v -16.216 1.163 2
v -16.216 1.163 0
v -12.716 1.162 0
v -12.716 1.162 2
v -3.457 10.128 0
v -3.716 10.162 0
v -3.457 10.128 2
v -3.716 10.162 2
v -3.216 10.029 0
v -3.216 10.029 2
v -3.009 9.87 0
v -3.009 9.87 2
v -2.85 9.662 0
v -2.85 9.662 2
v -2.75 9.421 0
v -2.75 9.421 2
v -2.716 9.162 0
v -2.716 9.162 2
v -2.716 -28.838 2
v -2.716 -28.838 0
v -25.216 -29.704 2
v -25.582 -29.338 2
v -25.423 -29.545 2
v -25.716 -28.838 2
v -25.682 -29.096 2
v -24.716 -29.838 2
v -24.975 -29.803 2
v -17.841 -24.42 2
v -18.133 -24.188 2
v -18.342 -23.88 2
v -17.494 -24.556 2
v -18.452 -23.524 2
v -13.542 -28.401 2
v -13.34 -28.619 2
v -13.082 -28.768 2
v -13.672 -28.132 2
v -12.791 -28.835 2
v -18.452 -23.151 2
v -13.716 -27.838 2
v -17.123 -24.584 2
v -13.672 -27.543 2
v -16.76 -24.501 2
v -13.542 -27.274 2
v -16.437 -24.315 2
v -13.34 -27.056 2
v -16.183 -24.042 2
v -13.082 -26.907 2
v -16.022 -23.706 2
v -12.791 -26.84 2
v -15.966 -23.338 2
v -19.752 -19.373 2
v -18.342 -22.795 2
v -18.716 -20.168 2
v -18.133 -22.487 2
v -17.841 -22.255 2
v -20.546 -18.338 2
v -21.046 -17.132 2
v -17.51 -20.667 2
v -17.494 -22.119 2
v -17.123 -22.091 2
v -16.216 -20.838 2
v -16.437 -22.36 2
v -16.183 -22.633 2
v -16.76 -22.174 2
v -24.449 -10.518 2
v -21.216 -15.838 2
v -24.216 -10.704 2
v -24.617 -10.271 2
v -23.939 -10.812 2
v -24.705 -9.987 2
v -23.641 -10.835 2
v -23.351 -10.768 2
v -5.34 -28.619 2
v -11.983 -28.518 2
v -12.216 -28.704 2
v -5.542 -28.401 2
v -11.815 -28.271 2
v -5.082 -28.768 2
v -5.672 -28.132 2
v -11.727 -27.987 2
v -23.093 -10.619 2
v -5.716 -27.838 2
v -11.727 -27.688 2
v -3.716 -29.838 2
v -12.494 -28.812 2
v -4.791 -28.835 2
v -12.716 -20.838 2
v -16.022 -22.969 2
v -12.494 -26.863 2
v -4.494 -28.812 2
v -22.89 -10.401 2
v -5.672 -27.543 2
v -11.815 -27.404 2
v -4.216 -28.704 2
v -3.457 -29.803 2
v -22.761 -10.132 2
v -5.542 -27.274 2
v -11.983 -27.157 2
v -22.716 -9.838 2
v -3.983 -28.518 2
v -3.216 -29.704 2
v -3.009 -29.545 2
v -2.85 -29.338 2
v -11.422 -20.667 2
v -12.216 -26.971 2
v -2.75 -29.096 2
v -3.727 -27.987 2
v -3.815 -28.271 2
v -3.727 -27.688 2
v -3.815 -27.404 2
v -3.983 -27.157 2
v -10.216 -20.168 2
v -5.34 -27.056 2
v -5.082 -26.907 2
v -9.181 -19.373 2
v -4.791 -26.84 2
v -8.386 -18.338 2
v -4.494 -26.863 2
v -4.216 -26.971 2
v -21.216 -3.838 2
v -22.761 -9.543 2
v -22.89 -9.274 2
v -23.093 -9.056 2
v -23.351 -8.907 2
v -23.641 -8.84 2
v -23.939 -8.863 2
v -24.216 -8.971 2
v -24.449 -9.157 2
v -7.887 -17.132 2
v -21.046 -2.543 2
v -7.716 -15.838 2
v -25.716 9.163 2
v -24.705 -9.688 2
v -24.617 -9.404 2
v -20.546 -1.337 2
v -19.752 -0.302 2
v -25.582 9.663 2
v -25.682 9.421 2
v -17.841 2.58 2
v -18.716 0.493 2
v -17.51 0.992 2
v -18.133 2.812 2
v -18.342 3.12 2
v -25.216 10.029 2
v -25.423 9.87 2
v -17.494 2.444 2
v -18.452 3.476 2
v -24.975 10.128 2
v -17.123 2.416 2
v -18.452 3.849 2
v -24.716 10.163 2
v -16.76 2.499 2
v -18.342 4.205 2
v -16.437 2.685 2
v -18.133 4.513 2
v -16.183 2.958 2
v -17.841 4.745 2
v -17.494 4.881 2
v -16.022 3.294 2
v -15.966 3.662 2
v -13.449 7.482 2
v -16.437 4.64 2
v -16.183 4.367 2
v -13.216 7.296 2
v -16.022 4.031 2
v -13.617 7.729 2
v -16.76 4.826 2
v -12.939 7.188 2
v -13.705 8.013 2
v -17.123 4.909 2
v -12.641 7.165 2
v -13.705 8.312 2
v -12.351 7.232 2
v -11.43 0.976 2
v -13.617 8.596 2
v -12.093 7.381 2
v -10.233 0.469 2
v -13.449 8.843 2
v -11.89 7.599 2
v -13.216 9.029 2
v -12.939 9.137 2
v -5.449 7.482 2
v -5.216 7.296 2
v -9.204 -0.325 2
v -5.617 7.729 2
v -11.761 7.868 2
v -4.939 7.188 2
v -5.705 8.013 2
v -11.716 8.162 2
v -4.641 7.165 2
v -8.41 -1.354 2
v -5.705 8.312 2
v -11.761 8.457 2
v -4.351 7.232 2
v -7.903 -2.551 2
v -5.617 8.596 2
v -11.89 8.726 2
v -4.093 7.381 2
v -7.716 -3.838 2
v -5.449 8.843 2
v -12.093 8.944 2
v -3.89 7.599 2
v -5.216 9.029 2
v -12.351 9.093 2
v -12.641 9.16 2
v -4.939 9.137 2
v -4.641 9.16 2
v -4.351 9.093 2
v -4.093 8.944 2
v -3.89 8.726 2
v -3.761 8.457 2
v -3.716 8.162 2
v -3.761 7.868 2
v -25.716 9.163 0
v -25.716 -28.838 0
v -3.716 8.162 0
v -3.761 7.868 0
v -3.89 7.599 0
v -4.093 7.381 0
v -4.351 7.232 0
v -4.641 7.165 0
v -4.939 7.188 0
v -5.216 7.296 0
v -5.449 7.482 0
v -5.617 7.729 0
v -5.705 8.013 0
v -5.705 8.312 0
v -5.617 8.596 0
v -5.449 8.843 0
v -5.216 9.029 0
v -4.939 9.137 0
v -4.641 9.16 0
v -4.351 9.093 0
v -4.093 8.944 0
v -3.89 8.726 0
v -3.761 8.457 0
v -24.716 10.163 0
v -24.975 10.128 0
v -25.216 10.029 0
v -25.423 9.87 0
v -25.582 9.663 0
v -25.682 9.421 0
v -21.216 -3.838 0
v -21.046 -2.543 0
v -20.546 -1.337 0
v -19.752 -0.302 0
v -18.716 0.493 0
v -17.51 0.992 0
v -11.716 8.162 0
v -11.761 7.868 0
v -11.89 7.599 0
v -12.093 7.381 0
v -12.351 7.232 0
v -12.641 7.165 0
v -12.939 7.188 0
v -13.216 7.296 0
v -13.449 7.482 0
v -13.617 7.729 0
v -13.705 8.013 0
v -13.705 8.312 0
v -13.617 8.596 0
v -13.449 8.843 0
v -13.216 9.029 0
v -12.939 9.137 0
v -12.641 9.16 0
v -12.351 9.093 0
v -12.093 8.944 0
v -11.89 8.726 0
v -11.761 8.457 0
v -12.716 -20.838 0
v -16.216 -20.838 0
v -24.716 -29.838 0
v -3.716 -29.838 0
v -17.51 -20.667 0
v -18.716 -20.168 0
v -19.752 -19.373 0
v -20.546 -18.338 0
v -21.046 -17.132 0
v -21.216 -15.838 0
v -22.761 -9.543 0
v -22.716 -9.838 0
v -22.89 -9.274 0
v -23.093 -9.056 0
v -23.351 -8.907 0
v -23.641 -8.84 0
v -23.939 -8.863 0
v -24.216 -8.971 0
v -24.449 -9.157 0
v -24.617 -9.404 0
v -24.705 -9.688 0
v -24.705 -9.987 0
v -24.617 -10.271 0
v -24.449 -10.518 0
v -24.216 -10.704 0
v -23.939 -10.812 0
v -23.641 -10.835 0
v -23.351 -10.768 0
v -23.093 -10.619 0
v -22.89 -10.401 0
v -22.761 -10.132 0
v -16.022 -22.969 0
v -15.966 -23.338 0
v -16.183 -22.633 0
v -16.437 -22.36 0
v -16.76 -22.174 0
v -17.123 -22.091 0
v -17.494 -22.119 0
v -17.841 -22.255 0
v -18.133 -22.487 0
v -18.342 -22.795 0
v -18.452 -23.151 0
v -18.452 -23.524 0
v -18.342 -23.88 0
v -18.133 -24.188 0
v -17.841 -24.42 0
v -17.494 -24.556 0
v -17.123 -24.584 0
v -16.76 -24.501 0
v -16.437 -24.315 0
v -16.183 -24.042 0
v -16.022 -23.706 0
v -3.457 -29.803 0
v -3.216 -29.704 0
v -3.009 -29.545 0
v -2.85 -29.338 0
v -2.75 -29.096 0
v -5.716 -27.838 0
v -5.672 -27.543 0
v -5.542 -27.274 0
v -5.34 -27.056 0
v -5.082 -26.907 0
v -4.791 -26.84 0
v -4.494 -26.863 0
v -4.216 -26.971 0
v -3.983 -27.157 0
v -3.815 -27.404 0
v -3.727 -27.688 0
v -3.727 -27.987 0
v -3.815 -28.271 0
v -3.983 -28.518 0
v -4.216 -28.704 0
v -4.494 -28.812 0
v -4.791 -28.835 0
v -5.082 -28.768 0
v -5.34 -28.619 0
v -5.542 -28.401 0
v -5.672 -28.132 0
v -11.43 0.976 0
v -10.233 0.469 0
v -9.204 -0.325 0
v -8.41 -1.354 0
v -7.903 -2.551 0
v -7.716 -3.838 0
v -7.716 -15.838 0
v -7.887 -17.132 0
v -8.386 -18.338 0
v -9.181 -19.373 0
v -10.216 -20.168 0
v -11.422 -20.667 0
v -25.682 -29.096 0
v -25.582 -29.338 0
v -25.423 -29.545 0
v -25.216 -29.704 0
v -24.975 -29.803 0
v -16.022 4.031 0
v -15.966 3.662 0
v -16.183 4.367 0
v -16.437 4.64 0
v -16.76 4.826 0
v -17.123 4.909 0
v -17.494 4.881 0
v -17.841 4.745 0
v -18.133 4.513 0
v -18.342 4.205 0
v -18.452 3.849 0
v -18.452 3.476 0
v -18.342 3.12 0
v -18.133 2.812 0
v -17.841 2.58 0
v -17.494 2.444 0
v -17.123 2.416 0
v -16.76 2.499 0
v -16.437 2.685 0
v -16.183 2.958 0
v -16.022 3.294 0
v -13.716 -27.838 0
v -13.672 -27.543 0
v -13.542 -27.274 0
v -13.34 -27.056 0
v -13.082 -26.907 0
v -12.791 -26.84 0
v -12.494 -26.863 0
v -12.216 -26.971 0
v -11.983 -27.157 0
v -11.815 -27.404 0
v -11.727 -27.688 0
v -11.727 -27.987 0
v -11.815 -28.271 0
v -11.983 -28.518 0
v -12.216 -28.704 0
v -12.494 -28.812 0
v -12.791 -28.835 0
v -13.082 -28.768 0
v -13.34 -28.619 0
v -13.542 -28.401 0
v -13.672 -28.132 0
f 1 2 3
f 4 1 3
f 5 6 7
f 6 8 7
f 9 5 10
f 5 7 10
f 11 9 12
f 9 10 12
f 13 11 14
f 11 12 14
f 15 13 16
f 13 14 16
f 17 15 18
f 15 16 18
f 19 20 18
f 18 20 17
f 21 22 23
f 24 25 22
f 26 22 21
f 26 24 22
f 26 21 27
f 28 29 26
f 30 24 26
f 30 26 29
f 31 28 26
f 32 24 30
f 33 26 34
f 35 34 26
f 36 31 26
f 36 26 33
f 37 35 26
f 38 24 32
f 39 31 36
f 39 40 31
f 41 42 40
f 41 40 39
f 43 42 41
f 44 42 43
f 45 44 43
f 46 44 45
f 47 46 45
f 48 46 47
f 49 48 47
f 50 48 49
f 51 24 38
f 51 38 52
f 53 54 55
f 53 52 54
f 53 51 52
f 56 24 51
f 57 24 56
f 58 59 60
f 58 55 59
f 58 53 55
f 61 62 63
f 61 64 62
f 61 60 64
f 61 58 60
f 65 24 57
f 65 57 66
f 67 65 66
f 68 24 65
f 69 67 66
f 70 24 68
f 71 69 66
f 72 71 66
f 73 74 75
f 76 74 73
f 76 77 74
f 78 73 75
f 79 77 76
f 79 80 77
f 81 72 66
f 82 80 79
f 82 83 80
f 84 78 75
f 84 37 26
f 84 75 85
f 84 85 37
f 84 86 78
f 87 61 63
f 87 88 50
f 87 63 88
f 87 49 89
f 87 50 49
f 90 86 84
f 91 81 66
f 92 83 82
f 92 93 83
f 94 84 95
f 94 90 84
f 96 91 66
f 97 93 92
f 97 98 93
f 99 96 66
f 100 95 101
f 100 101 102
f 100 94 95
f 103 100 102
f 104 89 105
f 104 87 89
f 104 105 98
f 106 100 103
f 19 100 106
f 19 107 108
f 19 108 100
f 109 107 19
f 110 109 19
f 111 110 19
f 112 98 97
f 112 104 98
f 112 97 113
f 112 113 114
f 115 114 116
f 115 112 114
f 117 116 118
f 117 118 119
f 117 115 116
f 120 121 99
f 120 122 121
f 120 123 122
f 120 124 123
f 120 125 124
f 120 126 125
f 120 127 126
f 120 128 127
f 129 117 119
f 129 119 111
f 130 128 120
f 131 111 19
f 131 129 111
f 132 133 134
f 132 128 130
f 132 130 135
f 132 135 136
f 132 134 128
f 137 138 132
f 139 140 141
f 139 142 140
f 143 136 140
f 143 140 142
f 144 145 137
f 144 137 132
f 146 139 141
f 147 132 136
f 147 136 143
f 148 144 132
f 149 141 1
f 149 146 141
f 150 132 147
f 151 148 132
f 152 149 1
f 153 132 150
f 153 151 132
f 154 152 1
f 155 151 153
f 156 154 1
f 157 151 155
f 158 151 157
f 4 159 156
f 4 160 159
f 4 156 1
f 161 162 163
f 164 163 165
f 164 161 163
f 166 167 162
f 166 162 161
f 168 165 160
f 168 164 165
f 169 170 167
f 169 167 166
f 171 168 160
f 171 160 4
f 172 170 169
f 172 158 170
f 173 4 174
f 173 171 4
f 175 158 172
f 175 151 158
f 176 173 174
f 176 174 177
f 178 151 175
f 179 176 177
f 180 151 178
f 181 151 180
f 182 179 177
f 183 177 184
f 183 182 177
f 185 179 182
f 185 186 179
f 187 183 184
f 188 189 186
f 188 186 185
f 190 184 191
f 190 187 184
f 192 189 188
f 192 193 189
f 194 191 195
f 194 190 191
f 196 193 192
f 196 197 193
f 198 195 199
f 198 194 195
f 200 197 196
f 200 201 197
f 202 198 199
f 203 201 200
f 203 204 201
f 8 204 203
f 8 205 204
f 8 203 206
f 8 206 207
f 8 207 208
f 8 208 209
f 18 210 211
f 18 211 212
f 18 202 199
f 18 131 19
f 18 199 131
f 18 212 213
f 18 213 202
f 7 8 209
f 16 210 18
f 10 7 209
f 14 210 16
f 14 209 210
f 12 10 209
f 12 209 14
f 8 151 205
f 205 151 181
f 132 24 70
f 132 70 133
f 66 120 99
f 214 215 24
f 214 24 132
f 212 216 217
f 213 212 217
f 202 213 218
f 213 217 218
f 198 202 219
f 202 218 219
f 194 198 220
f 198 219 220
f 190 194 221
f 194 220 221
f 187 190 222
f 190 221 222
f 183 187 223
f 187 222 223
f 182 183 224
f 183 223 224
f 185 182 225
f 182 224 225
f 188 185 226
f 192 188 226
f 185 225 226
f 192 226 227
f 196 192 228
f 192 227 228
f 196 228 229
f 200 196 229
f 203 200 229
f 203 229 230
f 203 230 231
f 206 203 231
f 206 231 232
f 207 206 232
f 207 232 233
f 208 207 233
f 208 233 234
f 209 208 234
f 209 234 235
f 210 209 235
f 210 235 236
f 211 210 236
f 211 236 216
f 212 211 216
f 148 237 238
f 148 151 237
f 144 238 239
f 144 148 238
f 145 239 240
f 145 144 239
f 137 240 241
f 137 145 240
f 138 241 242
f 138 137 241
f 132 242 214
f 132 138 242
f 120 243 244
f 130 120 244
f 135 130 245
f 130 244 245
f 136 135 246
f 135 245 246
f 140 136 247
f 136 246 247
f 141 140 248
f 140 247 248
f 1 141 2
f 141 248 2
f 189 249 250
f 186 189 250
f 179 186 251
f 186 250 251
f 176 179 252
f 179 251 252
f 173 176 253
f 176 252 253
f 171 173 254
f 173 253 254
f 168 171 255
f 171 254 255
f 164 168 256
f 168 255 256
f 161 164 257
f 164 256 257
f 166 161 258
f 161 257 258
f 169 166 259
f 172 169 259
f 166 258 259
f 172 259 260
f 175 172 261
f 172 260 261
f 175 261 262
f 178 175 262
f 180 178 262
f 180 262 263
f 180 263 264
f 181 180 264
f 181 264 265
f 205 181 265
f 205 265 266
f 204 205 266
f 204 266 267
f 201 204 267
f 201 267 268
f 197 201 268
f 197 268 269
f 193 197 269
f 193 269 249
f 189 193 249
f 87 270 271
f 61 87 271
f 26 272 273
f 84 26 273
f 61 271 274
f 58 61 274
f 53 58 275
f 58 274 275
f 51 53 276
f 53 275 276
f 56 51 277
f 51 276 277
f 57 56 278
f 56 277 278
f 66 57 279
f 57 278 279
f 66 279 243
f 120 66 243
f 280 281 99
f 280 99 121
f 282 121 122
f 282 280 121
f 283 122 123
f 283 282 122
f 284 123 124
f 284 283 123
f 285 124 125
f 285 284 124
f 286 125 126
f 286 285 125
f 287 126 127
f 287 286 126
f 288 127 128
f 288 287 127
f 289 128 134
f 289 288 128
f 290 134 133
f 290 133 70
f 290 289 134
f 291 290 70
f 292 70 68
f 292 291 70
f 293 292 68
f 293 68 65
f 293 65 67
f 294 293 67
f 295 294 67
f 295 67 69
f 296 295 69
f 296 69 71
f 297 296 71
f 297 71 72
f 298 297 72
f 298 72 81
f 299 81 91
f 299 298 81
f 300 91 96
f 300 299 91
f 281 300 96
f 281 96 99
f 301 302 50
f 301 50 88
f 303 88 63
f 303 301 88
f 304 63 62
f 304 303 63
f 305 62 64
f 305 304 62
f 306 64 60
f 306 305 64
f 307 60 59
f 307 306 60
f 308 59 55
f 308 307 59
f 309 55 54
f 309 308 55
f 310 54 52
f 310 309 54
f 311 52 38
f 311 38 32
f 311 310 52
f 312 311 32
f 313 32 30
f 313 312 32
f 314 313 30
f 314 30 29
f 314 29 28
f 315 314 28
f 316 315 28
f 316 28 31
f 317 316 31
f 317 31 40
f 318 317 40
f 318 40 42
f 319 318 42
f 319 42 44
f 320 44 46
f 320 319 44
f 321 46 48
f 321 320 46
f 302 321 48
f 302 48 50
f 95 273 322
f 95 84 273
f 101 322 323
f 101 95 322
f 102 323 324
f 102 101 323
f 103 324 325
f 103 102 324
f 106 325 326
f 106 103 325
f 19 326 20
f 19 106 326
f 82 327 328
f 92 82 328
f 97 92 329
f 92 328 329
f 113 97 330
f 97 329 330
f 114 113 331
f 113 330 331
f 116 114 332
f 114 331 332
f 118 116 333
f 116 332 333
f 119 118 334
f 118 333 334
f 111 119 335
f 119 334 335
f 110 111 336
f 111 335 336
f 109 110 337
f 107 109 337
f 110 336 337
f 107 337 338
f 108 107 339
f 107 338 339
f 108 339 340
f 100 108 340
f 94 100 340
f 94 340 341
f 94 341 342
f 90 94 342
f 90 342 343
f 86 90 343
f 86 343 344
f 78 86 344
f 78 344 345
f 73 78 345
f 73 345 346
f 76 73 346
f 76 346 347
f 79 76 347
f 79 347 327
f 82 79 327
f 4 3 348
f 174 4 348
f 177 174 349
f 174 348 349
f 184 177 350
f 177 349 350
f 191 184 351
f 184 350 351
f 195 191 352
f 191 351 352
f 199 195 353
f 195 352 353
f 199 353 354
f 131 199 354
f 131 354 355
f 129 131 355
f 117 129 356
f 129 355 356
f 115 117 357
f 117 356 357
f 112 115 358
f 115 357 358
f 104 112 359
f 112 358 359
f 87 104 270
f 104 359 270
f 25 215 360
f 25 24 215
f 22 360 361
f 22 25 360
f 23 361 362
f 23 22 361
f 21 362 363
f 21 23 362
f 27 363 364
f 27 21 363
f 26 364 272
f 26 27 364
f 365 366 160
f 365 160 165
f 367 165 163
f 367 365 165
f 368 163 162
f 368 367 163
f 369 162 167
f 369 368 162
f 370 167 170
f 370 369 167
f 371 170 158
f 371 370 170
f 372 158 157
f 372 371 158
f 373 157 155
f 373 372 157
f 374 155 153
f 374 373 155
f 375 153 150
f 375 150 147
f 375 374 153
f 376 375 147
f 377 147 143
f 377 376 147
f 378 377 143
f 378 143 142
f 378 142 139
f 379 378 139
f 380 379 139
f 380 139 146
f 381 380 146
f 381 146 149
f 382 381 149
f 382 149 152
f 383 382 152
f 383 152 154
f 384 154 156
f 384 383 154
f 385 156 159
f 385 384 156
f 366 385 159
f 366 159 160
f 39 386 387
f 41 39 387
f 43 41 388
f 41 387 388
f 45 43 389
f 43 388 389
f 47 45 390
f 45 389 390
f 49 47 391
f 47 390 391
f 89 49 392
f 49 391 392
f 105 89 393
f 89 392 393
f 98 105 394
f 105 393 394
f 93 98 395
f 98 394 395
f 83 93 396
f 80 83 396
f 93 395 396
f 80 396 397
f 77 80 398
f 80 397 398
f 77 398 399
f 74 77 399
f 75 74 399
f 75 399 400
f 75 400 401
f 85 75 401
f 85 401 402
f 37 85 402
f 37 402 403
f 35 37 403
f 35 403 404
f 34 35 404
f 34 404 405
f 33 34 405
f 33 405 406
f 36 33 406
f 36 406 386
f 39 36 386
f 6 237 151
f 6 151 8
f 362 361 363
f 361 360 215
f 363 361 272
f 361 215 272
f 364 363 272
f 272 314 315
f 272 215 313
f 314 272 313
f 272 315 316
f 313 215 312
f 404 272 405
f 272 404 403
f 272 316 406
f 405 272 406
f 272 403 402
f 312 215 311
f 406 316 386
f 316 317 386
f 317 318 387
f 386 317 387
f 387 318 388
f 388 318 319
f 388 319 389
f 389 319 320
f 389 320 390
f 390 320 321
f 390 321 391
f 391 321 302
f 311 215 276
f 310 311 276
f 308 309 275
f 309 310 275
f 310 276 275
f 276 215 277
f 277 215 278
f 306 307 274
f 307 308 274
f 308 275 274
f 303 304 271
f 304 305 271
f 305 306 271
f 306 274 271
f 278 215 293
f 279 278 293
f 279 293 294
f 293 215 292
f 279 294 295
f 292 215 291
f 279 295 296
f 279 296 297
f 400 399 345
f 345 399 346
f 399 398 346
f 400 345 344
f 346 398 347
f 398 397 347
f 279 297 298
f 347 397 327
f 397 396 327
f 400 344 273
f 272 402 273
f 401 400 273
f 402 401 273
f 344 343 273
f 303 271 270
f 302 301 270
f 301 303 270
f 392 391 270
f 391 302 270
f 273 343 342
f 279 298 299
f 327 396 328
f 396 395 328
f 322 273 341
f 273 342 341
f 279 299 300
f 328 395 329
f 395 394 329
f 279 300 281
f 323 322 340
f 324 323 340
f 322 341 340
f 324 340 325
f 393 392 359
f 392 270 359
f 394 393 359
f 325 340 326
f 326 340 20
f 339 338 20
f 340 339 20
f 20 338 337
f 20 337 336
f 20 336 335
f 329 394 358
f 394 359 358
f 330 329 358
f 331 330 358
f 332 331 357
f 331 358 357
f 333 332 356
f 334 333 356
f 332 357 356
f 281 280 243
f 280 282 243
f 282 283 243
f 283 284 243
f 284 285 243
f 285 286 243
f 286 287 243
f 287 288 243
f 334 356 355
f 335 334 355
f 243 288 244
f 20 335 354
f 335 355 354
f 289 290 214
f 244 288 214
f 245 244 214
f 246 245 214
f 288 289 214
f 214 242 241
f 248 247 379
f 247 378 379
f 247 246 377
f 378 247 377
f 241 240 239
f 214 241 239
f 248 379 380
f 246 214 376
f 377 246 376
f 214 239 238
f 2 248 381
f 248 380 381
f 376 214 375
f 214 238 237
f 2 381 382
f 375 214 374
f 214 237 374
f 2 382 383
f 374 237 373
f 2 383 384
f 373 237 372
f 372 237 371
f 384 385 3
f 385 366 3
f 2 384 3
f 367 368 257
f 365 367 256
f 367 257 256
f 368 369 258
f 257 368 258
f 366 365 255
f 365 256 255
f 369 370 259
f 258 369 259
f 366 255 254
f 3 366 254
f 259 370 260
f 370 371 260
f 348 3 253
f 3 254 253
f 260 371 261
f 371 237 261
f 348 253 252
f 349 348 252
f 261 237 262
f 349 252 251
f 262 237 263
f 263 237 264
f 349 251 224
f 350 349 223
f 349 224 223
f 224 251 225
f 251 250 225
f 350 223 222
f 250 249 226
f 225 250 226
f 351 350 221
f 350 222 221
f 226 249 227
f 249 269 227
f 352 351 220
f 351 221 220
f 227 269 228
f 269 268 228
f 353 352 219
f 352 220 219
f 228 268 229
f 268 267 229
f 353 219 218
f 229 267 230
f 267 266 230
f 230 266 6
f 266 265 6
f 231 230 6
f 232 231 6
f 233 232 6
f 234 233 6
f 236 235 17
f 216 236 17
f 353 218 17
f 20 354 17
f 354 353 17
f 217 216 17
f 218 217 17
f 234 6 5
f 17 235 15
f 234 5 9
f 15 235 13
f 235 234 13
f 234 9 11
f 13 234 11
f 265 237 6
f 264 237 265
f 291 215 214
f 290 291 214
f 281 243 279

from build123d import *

# Parameters (mm, degrees)
SKETCH_1_W          = 41
SKETCH_1_H          = 40
SKETCH_1_R          = 1.25
SKETCH_1_R_2        = 1
EXTRUDE_1_DEPTH     = 2
SKETCH_4_W          = 18
SKETCH_4_H          = 22
CUT_EXTRUDE_1_DEPTH = 2
FILLET_2_R          = 2.5
FILLET_3_R          = 5
CUT_EXTRUDE_2_DEPTH = 2
FILLET_4_R          = 1
SKETCH_6_W          = 18
SKETCH_6_H          = 14
CUT_EXTRUDE_3_DEPTH = 10
FILLET_5_R          = 1
SKETCH_7_R          = 1
CUT_EXTRUDE_4_DEPTH = 10


with BuildPart() as part:
    # 草圖1 → 填料-伸長1 (new body)
    with BuildSketch(Plane.XY):
        with Locations((-5.216213198, -9.8375)):
            Rectangle(SKETCH_1_W, SKETCH_1_H)
        with Locations((-17.216213198, 3.6625)):
            Circle(SKETCH_1_R, mode=Mode.SUBTRACT)
        with Locations((-17.216213198, -23.3375)):
            Circle(SKETCH_1_R, mode=Mode.SUBTRACT)
        with Locations((12.783786802, -23.3375)):
            Circle(SKETCH_1_R, mode=Mode.SUBTRACT)
        with Locations((12.783786802, 3.6625)):
            Circle(SKETCH_1_R, mode=Mode.SUBTRACT)
        with Locations((-23.716213198, -9.8375)):
            Circle(SKETCH_1_R_2, mode=Mode.SUBTRACT)
    extrude(amount=EXTRUDE_1_DEPTH)

    # 草圖4 → 除料-伸長1 (cut)
    with BuildSketch(Plane(origin=(0, 0, 0), x_dir=(-1, 0, 0), z_dir=(0, 0, -1))):
        with Locations((-6.283786802, -9.8375)):
            Rectangle(SKETCH_4_W, SKETCH_4_H)
    extrude(amount=-CUT_EXTRUDE_1_DEPTH, mode=Mode.SUBTRACT)

    # 圓角2
    fillet_2_edges = [part.edges().sort_by_distance(p)[0] for p in [
        (15.283786802, -20.8375, 1),
        (15.283786802, 1.1625, 1),
    ]]
    fillet(fillet_2_edges, radius=FILLET_2_R)

    # 圓角3
    fillet_3_edges = [part.edges().sort_by_distance(p)[0] for p in [
        (-2.716213198, 1.1625, 1),
        (-2.716213198, -20.8375, 1),
    ]]
    fillet(fillet_3_edges, radius=FILLET_3_R)

    # 草圖5 → 除料-伸長2 (cut)
    with BuildSketch(Plane(origin=(0, 0, 0), x_dir=(-1, 0, 0), z_dir=(0, 0, -1))):
        with BuildLine():
            Line((7.716213198, -3.8375), (7.716213198, -15.8375))
            ThreePointArc((7.716213198, -15.8375), (9.180679292, -19.373033906), (12.716213198, -20.8375))
            Line((12.716213198, -20.8375), (16.216213198, -20.8375))
            ThreePointArc((16.216213198, -20.8375), (19.751747104, -19.373033906), (21.216213198, -15.8375))
            Line((21.216213198, -15.8375), (21.216213198, -3.8375))
            ThreePointArc((21.216213198, -3.8375), (19.751747104, -0.301966094), (16.216213198, 1.1625))
            Line((16.216213198, 1.1625), (12.716213198, 1.1625))
            ThreePointArc((12.716213198, 1.1625), (9.204017559, -0.325304361), (7.716213198, -3.8375))
        make_face()
    extrude(amount=-CUT_EXTRUDE_2_DEPTH, mode=Mode.SUBTRACT)

    # 圓角4
    fillet_4_edges = [part.edges().sort_by_distance(p)[0] for p in [
        (-25.716213198, 10.1625, 1),
        (15.283786802, 10.1625, 1),
        (15.283786802, -29.8375, 1),
        (-25.716213198, -29.8375, 1),
    ]]
    fillet(fillet_4_edges, radius=FILLET_4_R)

    # 草圖6 → 除料-伸長3 (cut)
    with BuildSketch(Plane(origin=(0, 0, 0), x_dir=(-1, 0, 0), z_dir=(0, 0, -1))):
        with Locations((-6.283786802, 3.1625)):
            Rectangle(SKETCH_6_W, SKETCH_6_H)
        with Locations((-6.283786802, -22.8375)):
            Rectangle(SKETCH_6_W, SKETCH_6_H)
    extrude(amount=-CUT_EXTRUDE_3_DEPTH, mode=Mode.SUBTRACT)

    # 圓角5
    fillet_5_edges = [part.edges().sort_by_distance(p)[0] for p in [
        (-2.716213198, 10.1625, 1),
        (-2.716213198, -29.8375, 1),
    ]]
    fillet(fillet_5_edges, radius=FILLET_5_R)

    # 草圖7 → 除料-伸長4 (cut)
    with BuildSketch(Plane(origin=(0, 0, 0), x_dir=(-1, 0, 0), z_dir=(0, 0, -1))):
        with Locations((4.716213198, -27.8375)):
            Circle(SKETCH_7_R)
        with Locations((12.716213198, -27.8375)):
            Circle(SKETCH_7_R)
        with Locations(Location((12.716213198, 8.1625, 0), (0, 0, 180))):
            Circle(SKETCH_7_R)
        with Locations(Location((4.716213198, 8.1625, 0), (0, 0, 180))):
            Circle(SKETCH_7_R)
    extrude(amount=-CUT_EXTRUDE_4_DEPTH, mode=Mode.SUBTRACT)


solid = part.part
